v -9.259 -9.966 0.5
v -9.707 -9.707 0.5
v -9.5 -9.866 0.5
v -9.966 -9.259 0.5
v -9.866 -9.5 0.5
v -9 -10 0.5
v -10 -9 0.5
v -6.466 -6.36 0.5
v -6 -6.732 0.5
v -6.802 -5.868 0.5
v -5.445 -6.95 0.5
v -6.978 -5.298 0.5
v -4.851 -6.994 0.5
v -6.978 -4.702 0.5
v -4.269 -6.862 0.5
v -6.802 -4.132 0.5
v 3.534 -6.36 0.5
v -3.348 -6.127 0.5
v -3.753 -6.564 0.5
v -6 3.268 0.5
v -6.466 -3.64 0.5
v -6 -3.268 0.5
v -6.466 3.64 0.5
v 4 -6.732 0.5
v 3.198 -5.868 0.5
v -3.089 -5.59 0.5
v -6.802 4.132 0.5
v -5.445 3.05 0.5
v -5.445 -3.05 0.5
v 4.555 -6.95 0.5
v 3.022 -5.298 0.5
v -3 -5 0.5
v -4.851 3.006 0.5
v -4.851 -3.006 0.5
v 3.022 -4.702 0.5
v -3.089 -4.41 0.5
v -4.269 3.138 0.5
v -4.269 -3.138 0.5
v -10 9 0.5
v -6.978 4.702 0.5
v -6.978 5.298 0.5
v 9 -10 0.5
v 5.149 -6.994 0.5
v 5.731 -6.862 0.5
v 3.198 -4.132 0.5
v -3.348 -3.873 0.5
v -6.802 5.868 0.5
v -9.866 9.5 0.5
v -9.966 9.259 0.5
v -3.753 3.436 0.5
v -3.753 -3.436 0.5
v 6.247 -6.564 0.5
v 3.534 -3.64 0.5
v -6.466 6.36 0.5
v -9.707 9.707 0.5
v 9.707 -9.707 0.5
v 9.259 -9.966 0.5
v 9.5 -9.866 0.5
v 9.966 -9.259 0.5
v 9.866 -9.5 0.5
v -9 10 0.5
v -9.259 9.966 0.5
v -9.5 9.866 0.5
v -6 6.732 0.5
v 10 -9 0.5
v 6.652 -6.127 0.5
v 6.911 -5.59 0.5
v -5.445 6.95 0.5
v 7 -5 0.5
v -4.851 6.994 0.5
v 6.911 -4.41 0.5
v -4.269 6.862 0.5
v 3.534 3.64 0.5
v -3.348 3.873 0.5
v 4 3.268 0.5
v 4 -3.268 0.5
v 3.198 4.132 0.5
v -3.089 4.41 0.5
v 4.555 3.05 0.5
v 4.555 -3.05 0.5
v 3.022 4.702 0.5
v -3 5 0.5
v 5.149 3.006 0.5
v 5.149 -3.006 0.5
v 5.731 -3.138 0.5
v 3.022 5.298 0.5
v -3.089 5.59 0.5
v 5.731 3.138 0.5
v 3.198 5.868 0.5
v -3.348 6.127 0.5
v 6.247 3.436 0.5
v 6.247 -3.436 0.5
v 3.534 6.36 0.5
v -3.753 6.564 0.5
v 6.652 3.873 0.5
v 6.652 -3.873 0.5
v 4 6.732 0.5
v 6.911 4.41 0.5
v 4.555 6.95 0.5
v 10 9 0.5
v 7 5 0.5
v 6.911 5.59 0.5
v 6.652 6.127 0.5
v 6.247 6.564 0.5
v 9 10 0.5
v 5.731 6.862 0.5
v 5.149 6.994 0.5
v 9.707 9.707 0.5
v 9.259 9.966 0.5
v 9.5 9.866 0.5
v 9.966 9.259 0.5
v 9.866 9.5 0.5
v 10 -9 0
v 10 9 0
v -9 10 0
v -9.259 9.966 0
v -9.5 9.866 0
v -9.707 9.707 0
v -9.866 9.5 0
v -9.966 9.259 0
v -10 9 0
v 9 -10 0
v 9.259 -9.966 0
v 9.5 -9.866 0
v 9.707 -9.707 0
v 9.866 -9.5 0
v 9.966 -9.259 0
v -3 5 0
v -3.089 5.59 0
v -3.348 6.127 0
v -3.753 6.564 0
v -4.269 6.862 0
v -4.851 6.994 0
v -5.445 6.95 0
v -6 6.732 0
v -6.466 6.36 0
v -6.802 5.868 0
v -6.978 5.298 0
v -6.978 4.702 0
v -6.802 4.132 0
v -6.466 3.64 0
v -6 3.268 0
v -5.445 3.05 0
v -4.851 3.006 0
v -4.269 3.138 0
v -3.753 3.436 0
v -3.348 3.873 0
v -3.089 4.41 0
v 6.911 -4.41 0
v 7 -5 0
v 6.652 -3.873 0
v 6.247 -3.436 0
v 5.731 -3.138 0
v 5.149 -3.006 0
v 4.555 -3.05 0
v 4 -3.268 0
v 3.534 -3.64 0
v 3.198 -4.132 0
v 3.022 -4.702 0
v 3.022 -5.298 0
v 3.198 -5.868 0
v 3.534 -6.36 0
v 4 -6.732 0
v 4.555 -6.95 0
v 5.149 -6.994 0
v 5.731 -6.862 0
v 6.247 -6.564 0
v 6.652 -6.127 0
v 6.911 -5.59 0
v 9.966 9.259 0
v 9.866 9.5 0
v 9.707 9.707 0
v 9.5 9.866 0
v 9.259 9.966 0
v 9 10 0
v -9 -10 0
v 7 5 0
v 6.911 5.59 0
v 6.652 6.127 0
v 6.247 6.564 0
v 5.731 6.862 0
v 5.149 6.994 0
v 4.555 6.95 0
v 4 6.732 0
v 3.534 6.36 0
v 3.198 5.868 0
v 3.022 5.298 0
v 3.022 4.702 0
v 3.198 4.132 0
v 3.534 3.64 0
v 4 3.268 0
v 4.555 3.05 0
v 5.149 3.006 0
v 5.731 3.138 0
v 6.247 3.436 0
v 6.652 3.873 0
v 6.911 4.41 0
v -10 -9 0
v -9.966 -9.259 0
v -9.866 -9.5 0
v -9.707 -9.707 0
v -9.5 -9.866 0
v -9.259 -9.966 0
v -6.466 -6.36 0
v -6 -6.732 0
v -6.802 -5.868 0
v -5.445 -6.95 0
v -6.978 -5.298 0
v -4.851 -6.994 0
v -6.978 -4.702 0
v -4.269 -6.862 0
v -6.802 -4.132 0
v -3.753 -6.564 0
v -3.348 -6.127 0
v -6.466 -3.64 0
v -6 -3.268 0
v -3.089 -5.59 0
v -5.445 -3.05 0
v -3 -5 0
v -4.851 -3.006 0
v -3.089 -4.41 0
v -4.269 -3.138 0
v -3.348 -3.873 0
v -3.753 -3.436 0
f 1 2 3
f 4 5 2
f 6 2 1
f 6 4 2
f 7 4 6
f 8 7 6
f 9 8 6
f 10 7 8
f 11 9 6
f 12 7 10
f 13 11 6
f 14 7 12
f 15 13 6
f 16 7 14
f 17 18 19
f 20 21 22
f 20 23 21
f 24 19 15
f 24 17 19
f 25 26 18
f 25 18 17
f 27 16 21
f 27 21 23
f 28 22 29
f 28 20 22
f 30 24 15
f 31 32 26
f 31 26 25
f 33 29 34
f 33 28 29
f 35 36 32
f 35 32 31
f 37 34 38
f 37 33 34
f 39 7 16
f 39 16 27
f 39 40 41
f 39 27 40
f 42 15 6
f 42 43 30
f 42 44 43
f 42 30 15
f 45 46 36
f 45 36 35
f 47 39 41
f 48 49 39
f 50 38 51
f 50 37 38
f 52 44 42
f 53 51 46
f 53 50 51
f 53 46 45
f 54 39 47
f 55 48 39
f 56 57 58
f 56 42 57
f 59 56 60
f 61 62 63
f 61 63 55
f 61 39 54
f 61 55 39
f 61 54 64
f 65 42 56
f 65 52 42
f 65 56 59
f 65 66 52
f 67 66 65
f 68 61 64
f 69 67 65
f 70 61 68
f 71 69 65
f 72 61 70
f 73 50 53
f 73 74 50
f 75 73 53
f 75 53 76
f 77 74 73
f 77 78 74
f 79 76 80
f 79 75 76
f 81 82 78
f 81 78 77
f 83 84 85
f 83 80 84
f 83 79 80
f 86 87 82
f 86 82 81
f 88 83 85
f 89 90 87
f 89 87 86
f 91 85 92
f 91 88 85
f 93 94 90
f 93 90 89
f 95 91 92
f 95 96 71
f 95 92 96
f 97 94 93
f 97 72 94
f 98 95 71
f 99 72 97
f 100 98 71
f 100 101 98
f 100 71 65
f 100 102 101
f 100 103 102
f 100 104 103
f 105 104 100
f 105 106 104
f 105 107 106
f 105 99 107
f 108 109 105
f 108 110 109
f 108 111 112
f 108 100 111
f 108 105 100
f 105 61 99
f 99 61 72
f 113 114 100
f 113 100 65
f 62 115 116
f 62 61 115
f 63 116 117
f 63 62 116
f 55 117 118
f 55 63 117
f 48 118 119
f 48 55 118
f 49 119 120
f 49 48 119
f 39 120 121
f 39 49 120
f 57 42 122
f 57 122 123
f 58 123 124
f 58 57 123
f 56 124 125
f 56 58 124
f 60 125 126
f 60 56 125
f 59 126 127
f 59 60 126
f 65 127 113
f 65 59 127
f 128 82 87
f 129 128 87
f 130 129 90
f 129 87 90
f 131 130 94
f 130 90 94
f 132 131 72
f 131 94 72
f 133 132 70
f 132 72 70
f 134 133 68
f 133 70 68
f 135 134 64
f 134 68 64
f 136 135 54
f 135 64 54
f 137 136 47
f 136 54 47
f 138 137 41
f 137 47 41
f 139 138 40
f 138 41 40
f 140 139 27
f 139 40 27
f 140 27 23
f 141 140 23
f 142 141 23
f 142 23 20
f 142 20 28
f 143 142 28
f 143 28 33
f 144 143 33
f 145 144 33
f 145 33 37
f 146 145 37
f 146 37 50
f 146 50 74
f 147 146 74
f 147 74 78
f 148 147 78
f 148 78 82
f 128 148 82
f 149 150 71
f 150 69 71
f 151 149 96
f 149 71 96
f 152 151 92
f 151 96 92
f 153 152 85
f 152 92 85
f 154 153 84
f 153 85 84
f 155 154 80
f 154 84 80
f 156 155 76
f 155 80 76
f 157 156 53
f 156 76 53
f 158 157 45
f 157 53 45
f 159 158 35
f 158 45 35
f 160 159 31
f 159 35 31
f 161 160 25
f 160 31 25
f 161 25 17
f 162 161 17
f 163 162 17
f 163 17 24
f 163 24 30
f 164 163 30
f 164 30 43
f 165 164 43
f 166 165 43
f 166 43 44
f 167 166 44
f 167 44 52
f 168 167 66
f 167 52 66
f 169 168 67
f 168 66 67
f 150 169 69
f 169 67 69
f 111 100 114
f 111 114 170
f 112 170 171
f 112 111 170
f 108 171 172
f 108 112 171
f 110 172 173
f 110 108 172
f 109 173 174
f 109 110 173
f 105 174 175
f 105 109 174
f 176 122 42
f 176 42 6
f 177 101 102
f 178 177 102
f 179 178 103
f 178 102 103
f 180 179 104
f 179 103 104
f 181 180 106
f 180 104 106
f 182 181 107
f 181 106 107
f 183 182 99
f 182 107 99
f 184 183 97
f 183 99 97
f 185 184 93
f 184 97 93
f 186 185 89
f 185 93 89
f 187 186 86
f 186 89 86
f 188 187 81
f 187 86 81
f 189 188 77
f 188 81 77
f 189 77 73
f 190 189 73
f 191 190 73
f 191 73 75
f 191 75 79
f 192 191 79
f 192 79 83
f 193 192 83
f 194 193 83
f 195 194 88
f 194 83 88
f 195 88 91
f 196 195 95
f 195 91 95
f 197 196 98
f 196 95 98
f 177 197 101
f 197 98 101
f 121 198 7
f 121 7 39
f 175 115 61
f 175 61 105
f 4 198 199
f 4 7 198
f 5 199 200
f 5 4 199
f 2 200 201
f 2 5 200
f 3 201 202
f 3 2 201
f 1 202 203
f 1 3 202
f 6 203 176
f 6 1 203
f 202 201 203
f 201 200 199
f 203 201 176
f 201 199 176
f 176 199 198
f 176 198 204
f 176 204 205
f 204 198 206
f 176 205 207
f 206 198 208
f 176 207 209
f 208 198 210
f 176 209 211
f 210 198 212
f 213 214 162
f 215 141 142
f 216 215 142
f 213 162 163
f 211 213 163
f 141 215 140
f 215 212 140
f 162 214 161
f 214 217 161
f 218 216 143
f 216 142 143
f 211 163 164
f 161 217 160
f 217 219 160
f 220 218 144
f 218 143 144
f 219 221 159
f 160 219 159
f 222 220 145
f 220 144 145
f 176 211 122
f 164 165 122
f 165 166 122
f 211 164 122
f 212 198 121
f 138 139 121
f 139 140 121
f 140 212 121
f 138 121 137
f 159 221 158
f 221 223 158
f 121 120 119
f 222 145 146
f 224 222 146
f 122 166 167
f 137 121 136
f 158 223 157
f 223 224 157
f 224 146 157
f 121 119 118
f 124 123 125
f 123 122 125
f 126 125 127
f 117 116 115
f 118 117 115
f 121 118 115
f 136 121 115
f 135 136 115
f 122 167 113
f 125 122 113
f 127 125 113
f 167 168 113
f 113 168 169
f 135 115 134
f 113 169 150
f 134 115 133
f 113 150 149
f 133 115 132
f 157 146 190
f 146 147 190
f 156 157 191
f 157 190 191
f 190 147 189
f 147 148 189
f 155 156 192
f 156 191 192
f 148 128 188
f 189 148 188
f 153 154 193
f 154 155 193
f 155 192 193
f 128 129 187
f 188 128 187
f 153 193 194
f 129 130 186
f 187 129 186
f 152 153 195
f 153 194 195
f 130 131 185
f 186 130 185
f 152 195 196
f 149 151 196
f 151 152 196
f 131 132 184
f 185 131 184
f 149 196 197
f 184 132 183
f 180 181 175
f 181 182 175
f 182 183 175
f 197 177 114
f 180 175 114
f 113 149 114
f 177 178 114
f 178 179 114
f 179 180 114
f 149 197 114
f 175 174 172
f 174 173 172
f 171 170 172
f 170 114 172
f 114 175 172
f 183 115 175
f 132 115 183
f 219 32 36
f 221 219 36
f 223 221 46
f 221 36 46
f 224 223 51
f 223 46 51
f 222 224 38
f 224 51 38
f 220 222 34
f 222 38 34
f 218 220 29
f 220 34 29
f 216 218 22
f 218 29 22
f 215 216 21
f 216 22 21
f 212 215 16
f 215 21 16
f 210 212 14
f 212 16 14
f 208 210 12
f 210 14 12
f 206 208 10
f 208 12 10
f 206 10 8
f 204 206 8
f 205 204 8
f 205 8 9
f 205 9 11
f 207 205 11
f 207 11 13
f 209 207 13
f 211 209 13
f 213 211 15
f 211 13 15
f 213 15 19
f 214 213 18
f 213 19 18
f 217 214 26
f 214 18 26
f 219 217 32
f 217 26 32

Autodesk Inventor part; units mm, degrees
ref_plane "YZ Plane" through (0, 0, 0) normal (1, 0, 0) x (0, 1, 0)
ref_plane "XZ Plane" through (0, 0, 0) normal (0, 1, 0) x (-1, 0, 0)
ref_plane "XY Plane" through (0, 0, 0) normal (0, 0, 1) x (1, 0, 0)
sketch "Náčrt1" plane through (0, 0, 0) normal (0, 0, 1) x (1, 0, 0)
  line L0 (-10, 10) -> (10, 10)
  line L1 (10, 10) -> (10, -10)
  line L2 (10, -10) -> (-10, -10)
  line L3 (-10, -10) -> (-10, 10)
  point P0 (0, 0)
  dimension "d0" = 20
  dimension "d1" = 20
  dimension "d2" = 10
  dimension "d3" = 10
extrude "Vysunutí1" add sketch "Náčrt1" along normal blind 0.5
sketch "Náčrt2" plane through (0, 0, 0.5) normal (0, 0, 1) x (1, 0, 0)
  circle A0 centre (-5, 5) radius 2
  line L0 (10, 10) -> (-10, 10) projected
  line L1 (-10, 10) -> (-10, -10) projected
  point P0 (0, 0)
  dimension "d6" = 4
  dimension "d7" = 5
  dimension "d8" = 5
extrude "Vysunutí2" cut sketch "Náčrt2" against normal blind 0.5
pattern_linear "Obdélníkové pole1" count 2 spacing 10 along (1, 0, 0) count 2 spacing 10 along (0, -1, 0) of "Vysunutí2"
fillet "Zaoblení1" radius 1 1 edges at (10, 10, 0.25)
fillet "Zaoblení2" radius 1 2 edges at (-10, 10, 0.25) (-10, -10, 0.25)
fillet "Zaoblení3" radius 1 1 edges at (10, -10, 0.25)
properties part number "4076"
